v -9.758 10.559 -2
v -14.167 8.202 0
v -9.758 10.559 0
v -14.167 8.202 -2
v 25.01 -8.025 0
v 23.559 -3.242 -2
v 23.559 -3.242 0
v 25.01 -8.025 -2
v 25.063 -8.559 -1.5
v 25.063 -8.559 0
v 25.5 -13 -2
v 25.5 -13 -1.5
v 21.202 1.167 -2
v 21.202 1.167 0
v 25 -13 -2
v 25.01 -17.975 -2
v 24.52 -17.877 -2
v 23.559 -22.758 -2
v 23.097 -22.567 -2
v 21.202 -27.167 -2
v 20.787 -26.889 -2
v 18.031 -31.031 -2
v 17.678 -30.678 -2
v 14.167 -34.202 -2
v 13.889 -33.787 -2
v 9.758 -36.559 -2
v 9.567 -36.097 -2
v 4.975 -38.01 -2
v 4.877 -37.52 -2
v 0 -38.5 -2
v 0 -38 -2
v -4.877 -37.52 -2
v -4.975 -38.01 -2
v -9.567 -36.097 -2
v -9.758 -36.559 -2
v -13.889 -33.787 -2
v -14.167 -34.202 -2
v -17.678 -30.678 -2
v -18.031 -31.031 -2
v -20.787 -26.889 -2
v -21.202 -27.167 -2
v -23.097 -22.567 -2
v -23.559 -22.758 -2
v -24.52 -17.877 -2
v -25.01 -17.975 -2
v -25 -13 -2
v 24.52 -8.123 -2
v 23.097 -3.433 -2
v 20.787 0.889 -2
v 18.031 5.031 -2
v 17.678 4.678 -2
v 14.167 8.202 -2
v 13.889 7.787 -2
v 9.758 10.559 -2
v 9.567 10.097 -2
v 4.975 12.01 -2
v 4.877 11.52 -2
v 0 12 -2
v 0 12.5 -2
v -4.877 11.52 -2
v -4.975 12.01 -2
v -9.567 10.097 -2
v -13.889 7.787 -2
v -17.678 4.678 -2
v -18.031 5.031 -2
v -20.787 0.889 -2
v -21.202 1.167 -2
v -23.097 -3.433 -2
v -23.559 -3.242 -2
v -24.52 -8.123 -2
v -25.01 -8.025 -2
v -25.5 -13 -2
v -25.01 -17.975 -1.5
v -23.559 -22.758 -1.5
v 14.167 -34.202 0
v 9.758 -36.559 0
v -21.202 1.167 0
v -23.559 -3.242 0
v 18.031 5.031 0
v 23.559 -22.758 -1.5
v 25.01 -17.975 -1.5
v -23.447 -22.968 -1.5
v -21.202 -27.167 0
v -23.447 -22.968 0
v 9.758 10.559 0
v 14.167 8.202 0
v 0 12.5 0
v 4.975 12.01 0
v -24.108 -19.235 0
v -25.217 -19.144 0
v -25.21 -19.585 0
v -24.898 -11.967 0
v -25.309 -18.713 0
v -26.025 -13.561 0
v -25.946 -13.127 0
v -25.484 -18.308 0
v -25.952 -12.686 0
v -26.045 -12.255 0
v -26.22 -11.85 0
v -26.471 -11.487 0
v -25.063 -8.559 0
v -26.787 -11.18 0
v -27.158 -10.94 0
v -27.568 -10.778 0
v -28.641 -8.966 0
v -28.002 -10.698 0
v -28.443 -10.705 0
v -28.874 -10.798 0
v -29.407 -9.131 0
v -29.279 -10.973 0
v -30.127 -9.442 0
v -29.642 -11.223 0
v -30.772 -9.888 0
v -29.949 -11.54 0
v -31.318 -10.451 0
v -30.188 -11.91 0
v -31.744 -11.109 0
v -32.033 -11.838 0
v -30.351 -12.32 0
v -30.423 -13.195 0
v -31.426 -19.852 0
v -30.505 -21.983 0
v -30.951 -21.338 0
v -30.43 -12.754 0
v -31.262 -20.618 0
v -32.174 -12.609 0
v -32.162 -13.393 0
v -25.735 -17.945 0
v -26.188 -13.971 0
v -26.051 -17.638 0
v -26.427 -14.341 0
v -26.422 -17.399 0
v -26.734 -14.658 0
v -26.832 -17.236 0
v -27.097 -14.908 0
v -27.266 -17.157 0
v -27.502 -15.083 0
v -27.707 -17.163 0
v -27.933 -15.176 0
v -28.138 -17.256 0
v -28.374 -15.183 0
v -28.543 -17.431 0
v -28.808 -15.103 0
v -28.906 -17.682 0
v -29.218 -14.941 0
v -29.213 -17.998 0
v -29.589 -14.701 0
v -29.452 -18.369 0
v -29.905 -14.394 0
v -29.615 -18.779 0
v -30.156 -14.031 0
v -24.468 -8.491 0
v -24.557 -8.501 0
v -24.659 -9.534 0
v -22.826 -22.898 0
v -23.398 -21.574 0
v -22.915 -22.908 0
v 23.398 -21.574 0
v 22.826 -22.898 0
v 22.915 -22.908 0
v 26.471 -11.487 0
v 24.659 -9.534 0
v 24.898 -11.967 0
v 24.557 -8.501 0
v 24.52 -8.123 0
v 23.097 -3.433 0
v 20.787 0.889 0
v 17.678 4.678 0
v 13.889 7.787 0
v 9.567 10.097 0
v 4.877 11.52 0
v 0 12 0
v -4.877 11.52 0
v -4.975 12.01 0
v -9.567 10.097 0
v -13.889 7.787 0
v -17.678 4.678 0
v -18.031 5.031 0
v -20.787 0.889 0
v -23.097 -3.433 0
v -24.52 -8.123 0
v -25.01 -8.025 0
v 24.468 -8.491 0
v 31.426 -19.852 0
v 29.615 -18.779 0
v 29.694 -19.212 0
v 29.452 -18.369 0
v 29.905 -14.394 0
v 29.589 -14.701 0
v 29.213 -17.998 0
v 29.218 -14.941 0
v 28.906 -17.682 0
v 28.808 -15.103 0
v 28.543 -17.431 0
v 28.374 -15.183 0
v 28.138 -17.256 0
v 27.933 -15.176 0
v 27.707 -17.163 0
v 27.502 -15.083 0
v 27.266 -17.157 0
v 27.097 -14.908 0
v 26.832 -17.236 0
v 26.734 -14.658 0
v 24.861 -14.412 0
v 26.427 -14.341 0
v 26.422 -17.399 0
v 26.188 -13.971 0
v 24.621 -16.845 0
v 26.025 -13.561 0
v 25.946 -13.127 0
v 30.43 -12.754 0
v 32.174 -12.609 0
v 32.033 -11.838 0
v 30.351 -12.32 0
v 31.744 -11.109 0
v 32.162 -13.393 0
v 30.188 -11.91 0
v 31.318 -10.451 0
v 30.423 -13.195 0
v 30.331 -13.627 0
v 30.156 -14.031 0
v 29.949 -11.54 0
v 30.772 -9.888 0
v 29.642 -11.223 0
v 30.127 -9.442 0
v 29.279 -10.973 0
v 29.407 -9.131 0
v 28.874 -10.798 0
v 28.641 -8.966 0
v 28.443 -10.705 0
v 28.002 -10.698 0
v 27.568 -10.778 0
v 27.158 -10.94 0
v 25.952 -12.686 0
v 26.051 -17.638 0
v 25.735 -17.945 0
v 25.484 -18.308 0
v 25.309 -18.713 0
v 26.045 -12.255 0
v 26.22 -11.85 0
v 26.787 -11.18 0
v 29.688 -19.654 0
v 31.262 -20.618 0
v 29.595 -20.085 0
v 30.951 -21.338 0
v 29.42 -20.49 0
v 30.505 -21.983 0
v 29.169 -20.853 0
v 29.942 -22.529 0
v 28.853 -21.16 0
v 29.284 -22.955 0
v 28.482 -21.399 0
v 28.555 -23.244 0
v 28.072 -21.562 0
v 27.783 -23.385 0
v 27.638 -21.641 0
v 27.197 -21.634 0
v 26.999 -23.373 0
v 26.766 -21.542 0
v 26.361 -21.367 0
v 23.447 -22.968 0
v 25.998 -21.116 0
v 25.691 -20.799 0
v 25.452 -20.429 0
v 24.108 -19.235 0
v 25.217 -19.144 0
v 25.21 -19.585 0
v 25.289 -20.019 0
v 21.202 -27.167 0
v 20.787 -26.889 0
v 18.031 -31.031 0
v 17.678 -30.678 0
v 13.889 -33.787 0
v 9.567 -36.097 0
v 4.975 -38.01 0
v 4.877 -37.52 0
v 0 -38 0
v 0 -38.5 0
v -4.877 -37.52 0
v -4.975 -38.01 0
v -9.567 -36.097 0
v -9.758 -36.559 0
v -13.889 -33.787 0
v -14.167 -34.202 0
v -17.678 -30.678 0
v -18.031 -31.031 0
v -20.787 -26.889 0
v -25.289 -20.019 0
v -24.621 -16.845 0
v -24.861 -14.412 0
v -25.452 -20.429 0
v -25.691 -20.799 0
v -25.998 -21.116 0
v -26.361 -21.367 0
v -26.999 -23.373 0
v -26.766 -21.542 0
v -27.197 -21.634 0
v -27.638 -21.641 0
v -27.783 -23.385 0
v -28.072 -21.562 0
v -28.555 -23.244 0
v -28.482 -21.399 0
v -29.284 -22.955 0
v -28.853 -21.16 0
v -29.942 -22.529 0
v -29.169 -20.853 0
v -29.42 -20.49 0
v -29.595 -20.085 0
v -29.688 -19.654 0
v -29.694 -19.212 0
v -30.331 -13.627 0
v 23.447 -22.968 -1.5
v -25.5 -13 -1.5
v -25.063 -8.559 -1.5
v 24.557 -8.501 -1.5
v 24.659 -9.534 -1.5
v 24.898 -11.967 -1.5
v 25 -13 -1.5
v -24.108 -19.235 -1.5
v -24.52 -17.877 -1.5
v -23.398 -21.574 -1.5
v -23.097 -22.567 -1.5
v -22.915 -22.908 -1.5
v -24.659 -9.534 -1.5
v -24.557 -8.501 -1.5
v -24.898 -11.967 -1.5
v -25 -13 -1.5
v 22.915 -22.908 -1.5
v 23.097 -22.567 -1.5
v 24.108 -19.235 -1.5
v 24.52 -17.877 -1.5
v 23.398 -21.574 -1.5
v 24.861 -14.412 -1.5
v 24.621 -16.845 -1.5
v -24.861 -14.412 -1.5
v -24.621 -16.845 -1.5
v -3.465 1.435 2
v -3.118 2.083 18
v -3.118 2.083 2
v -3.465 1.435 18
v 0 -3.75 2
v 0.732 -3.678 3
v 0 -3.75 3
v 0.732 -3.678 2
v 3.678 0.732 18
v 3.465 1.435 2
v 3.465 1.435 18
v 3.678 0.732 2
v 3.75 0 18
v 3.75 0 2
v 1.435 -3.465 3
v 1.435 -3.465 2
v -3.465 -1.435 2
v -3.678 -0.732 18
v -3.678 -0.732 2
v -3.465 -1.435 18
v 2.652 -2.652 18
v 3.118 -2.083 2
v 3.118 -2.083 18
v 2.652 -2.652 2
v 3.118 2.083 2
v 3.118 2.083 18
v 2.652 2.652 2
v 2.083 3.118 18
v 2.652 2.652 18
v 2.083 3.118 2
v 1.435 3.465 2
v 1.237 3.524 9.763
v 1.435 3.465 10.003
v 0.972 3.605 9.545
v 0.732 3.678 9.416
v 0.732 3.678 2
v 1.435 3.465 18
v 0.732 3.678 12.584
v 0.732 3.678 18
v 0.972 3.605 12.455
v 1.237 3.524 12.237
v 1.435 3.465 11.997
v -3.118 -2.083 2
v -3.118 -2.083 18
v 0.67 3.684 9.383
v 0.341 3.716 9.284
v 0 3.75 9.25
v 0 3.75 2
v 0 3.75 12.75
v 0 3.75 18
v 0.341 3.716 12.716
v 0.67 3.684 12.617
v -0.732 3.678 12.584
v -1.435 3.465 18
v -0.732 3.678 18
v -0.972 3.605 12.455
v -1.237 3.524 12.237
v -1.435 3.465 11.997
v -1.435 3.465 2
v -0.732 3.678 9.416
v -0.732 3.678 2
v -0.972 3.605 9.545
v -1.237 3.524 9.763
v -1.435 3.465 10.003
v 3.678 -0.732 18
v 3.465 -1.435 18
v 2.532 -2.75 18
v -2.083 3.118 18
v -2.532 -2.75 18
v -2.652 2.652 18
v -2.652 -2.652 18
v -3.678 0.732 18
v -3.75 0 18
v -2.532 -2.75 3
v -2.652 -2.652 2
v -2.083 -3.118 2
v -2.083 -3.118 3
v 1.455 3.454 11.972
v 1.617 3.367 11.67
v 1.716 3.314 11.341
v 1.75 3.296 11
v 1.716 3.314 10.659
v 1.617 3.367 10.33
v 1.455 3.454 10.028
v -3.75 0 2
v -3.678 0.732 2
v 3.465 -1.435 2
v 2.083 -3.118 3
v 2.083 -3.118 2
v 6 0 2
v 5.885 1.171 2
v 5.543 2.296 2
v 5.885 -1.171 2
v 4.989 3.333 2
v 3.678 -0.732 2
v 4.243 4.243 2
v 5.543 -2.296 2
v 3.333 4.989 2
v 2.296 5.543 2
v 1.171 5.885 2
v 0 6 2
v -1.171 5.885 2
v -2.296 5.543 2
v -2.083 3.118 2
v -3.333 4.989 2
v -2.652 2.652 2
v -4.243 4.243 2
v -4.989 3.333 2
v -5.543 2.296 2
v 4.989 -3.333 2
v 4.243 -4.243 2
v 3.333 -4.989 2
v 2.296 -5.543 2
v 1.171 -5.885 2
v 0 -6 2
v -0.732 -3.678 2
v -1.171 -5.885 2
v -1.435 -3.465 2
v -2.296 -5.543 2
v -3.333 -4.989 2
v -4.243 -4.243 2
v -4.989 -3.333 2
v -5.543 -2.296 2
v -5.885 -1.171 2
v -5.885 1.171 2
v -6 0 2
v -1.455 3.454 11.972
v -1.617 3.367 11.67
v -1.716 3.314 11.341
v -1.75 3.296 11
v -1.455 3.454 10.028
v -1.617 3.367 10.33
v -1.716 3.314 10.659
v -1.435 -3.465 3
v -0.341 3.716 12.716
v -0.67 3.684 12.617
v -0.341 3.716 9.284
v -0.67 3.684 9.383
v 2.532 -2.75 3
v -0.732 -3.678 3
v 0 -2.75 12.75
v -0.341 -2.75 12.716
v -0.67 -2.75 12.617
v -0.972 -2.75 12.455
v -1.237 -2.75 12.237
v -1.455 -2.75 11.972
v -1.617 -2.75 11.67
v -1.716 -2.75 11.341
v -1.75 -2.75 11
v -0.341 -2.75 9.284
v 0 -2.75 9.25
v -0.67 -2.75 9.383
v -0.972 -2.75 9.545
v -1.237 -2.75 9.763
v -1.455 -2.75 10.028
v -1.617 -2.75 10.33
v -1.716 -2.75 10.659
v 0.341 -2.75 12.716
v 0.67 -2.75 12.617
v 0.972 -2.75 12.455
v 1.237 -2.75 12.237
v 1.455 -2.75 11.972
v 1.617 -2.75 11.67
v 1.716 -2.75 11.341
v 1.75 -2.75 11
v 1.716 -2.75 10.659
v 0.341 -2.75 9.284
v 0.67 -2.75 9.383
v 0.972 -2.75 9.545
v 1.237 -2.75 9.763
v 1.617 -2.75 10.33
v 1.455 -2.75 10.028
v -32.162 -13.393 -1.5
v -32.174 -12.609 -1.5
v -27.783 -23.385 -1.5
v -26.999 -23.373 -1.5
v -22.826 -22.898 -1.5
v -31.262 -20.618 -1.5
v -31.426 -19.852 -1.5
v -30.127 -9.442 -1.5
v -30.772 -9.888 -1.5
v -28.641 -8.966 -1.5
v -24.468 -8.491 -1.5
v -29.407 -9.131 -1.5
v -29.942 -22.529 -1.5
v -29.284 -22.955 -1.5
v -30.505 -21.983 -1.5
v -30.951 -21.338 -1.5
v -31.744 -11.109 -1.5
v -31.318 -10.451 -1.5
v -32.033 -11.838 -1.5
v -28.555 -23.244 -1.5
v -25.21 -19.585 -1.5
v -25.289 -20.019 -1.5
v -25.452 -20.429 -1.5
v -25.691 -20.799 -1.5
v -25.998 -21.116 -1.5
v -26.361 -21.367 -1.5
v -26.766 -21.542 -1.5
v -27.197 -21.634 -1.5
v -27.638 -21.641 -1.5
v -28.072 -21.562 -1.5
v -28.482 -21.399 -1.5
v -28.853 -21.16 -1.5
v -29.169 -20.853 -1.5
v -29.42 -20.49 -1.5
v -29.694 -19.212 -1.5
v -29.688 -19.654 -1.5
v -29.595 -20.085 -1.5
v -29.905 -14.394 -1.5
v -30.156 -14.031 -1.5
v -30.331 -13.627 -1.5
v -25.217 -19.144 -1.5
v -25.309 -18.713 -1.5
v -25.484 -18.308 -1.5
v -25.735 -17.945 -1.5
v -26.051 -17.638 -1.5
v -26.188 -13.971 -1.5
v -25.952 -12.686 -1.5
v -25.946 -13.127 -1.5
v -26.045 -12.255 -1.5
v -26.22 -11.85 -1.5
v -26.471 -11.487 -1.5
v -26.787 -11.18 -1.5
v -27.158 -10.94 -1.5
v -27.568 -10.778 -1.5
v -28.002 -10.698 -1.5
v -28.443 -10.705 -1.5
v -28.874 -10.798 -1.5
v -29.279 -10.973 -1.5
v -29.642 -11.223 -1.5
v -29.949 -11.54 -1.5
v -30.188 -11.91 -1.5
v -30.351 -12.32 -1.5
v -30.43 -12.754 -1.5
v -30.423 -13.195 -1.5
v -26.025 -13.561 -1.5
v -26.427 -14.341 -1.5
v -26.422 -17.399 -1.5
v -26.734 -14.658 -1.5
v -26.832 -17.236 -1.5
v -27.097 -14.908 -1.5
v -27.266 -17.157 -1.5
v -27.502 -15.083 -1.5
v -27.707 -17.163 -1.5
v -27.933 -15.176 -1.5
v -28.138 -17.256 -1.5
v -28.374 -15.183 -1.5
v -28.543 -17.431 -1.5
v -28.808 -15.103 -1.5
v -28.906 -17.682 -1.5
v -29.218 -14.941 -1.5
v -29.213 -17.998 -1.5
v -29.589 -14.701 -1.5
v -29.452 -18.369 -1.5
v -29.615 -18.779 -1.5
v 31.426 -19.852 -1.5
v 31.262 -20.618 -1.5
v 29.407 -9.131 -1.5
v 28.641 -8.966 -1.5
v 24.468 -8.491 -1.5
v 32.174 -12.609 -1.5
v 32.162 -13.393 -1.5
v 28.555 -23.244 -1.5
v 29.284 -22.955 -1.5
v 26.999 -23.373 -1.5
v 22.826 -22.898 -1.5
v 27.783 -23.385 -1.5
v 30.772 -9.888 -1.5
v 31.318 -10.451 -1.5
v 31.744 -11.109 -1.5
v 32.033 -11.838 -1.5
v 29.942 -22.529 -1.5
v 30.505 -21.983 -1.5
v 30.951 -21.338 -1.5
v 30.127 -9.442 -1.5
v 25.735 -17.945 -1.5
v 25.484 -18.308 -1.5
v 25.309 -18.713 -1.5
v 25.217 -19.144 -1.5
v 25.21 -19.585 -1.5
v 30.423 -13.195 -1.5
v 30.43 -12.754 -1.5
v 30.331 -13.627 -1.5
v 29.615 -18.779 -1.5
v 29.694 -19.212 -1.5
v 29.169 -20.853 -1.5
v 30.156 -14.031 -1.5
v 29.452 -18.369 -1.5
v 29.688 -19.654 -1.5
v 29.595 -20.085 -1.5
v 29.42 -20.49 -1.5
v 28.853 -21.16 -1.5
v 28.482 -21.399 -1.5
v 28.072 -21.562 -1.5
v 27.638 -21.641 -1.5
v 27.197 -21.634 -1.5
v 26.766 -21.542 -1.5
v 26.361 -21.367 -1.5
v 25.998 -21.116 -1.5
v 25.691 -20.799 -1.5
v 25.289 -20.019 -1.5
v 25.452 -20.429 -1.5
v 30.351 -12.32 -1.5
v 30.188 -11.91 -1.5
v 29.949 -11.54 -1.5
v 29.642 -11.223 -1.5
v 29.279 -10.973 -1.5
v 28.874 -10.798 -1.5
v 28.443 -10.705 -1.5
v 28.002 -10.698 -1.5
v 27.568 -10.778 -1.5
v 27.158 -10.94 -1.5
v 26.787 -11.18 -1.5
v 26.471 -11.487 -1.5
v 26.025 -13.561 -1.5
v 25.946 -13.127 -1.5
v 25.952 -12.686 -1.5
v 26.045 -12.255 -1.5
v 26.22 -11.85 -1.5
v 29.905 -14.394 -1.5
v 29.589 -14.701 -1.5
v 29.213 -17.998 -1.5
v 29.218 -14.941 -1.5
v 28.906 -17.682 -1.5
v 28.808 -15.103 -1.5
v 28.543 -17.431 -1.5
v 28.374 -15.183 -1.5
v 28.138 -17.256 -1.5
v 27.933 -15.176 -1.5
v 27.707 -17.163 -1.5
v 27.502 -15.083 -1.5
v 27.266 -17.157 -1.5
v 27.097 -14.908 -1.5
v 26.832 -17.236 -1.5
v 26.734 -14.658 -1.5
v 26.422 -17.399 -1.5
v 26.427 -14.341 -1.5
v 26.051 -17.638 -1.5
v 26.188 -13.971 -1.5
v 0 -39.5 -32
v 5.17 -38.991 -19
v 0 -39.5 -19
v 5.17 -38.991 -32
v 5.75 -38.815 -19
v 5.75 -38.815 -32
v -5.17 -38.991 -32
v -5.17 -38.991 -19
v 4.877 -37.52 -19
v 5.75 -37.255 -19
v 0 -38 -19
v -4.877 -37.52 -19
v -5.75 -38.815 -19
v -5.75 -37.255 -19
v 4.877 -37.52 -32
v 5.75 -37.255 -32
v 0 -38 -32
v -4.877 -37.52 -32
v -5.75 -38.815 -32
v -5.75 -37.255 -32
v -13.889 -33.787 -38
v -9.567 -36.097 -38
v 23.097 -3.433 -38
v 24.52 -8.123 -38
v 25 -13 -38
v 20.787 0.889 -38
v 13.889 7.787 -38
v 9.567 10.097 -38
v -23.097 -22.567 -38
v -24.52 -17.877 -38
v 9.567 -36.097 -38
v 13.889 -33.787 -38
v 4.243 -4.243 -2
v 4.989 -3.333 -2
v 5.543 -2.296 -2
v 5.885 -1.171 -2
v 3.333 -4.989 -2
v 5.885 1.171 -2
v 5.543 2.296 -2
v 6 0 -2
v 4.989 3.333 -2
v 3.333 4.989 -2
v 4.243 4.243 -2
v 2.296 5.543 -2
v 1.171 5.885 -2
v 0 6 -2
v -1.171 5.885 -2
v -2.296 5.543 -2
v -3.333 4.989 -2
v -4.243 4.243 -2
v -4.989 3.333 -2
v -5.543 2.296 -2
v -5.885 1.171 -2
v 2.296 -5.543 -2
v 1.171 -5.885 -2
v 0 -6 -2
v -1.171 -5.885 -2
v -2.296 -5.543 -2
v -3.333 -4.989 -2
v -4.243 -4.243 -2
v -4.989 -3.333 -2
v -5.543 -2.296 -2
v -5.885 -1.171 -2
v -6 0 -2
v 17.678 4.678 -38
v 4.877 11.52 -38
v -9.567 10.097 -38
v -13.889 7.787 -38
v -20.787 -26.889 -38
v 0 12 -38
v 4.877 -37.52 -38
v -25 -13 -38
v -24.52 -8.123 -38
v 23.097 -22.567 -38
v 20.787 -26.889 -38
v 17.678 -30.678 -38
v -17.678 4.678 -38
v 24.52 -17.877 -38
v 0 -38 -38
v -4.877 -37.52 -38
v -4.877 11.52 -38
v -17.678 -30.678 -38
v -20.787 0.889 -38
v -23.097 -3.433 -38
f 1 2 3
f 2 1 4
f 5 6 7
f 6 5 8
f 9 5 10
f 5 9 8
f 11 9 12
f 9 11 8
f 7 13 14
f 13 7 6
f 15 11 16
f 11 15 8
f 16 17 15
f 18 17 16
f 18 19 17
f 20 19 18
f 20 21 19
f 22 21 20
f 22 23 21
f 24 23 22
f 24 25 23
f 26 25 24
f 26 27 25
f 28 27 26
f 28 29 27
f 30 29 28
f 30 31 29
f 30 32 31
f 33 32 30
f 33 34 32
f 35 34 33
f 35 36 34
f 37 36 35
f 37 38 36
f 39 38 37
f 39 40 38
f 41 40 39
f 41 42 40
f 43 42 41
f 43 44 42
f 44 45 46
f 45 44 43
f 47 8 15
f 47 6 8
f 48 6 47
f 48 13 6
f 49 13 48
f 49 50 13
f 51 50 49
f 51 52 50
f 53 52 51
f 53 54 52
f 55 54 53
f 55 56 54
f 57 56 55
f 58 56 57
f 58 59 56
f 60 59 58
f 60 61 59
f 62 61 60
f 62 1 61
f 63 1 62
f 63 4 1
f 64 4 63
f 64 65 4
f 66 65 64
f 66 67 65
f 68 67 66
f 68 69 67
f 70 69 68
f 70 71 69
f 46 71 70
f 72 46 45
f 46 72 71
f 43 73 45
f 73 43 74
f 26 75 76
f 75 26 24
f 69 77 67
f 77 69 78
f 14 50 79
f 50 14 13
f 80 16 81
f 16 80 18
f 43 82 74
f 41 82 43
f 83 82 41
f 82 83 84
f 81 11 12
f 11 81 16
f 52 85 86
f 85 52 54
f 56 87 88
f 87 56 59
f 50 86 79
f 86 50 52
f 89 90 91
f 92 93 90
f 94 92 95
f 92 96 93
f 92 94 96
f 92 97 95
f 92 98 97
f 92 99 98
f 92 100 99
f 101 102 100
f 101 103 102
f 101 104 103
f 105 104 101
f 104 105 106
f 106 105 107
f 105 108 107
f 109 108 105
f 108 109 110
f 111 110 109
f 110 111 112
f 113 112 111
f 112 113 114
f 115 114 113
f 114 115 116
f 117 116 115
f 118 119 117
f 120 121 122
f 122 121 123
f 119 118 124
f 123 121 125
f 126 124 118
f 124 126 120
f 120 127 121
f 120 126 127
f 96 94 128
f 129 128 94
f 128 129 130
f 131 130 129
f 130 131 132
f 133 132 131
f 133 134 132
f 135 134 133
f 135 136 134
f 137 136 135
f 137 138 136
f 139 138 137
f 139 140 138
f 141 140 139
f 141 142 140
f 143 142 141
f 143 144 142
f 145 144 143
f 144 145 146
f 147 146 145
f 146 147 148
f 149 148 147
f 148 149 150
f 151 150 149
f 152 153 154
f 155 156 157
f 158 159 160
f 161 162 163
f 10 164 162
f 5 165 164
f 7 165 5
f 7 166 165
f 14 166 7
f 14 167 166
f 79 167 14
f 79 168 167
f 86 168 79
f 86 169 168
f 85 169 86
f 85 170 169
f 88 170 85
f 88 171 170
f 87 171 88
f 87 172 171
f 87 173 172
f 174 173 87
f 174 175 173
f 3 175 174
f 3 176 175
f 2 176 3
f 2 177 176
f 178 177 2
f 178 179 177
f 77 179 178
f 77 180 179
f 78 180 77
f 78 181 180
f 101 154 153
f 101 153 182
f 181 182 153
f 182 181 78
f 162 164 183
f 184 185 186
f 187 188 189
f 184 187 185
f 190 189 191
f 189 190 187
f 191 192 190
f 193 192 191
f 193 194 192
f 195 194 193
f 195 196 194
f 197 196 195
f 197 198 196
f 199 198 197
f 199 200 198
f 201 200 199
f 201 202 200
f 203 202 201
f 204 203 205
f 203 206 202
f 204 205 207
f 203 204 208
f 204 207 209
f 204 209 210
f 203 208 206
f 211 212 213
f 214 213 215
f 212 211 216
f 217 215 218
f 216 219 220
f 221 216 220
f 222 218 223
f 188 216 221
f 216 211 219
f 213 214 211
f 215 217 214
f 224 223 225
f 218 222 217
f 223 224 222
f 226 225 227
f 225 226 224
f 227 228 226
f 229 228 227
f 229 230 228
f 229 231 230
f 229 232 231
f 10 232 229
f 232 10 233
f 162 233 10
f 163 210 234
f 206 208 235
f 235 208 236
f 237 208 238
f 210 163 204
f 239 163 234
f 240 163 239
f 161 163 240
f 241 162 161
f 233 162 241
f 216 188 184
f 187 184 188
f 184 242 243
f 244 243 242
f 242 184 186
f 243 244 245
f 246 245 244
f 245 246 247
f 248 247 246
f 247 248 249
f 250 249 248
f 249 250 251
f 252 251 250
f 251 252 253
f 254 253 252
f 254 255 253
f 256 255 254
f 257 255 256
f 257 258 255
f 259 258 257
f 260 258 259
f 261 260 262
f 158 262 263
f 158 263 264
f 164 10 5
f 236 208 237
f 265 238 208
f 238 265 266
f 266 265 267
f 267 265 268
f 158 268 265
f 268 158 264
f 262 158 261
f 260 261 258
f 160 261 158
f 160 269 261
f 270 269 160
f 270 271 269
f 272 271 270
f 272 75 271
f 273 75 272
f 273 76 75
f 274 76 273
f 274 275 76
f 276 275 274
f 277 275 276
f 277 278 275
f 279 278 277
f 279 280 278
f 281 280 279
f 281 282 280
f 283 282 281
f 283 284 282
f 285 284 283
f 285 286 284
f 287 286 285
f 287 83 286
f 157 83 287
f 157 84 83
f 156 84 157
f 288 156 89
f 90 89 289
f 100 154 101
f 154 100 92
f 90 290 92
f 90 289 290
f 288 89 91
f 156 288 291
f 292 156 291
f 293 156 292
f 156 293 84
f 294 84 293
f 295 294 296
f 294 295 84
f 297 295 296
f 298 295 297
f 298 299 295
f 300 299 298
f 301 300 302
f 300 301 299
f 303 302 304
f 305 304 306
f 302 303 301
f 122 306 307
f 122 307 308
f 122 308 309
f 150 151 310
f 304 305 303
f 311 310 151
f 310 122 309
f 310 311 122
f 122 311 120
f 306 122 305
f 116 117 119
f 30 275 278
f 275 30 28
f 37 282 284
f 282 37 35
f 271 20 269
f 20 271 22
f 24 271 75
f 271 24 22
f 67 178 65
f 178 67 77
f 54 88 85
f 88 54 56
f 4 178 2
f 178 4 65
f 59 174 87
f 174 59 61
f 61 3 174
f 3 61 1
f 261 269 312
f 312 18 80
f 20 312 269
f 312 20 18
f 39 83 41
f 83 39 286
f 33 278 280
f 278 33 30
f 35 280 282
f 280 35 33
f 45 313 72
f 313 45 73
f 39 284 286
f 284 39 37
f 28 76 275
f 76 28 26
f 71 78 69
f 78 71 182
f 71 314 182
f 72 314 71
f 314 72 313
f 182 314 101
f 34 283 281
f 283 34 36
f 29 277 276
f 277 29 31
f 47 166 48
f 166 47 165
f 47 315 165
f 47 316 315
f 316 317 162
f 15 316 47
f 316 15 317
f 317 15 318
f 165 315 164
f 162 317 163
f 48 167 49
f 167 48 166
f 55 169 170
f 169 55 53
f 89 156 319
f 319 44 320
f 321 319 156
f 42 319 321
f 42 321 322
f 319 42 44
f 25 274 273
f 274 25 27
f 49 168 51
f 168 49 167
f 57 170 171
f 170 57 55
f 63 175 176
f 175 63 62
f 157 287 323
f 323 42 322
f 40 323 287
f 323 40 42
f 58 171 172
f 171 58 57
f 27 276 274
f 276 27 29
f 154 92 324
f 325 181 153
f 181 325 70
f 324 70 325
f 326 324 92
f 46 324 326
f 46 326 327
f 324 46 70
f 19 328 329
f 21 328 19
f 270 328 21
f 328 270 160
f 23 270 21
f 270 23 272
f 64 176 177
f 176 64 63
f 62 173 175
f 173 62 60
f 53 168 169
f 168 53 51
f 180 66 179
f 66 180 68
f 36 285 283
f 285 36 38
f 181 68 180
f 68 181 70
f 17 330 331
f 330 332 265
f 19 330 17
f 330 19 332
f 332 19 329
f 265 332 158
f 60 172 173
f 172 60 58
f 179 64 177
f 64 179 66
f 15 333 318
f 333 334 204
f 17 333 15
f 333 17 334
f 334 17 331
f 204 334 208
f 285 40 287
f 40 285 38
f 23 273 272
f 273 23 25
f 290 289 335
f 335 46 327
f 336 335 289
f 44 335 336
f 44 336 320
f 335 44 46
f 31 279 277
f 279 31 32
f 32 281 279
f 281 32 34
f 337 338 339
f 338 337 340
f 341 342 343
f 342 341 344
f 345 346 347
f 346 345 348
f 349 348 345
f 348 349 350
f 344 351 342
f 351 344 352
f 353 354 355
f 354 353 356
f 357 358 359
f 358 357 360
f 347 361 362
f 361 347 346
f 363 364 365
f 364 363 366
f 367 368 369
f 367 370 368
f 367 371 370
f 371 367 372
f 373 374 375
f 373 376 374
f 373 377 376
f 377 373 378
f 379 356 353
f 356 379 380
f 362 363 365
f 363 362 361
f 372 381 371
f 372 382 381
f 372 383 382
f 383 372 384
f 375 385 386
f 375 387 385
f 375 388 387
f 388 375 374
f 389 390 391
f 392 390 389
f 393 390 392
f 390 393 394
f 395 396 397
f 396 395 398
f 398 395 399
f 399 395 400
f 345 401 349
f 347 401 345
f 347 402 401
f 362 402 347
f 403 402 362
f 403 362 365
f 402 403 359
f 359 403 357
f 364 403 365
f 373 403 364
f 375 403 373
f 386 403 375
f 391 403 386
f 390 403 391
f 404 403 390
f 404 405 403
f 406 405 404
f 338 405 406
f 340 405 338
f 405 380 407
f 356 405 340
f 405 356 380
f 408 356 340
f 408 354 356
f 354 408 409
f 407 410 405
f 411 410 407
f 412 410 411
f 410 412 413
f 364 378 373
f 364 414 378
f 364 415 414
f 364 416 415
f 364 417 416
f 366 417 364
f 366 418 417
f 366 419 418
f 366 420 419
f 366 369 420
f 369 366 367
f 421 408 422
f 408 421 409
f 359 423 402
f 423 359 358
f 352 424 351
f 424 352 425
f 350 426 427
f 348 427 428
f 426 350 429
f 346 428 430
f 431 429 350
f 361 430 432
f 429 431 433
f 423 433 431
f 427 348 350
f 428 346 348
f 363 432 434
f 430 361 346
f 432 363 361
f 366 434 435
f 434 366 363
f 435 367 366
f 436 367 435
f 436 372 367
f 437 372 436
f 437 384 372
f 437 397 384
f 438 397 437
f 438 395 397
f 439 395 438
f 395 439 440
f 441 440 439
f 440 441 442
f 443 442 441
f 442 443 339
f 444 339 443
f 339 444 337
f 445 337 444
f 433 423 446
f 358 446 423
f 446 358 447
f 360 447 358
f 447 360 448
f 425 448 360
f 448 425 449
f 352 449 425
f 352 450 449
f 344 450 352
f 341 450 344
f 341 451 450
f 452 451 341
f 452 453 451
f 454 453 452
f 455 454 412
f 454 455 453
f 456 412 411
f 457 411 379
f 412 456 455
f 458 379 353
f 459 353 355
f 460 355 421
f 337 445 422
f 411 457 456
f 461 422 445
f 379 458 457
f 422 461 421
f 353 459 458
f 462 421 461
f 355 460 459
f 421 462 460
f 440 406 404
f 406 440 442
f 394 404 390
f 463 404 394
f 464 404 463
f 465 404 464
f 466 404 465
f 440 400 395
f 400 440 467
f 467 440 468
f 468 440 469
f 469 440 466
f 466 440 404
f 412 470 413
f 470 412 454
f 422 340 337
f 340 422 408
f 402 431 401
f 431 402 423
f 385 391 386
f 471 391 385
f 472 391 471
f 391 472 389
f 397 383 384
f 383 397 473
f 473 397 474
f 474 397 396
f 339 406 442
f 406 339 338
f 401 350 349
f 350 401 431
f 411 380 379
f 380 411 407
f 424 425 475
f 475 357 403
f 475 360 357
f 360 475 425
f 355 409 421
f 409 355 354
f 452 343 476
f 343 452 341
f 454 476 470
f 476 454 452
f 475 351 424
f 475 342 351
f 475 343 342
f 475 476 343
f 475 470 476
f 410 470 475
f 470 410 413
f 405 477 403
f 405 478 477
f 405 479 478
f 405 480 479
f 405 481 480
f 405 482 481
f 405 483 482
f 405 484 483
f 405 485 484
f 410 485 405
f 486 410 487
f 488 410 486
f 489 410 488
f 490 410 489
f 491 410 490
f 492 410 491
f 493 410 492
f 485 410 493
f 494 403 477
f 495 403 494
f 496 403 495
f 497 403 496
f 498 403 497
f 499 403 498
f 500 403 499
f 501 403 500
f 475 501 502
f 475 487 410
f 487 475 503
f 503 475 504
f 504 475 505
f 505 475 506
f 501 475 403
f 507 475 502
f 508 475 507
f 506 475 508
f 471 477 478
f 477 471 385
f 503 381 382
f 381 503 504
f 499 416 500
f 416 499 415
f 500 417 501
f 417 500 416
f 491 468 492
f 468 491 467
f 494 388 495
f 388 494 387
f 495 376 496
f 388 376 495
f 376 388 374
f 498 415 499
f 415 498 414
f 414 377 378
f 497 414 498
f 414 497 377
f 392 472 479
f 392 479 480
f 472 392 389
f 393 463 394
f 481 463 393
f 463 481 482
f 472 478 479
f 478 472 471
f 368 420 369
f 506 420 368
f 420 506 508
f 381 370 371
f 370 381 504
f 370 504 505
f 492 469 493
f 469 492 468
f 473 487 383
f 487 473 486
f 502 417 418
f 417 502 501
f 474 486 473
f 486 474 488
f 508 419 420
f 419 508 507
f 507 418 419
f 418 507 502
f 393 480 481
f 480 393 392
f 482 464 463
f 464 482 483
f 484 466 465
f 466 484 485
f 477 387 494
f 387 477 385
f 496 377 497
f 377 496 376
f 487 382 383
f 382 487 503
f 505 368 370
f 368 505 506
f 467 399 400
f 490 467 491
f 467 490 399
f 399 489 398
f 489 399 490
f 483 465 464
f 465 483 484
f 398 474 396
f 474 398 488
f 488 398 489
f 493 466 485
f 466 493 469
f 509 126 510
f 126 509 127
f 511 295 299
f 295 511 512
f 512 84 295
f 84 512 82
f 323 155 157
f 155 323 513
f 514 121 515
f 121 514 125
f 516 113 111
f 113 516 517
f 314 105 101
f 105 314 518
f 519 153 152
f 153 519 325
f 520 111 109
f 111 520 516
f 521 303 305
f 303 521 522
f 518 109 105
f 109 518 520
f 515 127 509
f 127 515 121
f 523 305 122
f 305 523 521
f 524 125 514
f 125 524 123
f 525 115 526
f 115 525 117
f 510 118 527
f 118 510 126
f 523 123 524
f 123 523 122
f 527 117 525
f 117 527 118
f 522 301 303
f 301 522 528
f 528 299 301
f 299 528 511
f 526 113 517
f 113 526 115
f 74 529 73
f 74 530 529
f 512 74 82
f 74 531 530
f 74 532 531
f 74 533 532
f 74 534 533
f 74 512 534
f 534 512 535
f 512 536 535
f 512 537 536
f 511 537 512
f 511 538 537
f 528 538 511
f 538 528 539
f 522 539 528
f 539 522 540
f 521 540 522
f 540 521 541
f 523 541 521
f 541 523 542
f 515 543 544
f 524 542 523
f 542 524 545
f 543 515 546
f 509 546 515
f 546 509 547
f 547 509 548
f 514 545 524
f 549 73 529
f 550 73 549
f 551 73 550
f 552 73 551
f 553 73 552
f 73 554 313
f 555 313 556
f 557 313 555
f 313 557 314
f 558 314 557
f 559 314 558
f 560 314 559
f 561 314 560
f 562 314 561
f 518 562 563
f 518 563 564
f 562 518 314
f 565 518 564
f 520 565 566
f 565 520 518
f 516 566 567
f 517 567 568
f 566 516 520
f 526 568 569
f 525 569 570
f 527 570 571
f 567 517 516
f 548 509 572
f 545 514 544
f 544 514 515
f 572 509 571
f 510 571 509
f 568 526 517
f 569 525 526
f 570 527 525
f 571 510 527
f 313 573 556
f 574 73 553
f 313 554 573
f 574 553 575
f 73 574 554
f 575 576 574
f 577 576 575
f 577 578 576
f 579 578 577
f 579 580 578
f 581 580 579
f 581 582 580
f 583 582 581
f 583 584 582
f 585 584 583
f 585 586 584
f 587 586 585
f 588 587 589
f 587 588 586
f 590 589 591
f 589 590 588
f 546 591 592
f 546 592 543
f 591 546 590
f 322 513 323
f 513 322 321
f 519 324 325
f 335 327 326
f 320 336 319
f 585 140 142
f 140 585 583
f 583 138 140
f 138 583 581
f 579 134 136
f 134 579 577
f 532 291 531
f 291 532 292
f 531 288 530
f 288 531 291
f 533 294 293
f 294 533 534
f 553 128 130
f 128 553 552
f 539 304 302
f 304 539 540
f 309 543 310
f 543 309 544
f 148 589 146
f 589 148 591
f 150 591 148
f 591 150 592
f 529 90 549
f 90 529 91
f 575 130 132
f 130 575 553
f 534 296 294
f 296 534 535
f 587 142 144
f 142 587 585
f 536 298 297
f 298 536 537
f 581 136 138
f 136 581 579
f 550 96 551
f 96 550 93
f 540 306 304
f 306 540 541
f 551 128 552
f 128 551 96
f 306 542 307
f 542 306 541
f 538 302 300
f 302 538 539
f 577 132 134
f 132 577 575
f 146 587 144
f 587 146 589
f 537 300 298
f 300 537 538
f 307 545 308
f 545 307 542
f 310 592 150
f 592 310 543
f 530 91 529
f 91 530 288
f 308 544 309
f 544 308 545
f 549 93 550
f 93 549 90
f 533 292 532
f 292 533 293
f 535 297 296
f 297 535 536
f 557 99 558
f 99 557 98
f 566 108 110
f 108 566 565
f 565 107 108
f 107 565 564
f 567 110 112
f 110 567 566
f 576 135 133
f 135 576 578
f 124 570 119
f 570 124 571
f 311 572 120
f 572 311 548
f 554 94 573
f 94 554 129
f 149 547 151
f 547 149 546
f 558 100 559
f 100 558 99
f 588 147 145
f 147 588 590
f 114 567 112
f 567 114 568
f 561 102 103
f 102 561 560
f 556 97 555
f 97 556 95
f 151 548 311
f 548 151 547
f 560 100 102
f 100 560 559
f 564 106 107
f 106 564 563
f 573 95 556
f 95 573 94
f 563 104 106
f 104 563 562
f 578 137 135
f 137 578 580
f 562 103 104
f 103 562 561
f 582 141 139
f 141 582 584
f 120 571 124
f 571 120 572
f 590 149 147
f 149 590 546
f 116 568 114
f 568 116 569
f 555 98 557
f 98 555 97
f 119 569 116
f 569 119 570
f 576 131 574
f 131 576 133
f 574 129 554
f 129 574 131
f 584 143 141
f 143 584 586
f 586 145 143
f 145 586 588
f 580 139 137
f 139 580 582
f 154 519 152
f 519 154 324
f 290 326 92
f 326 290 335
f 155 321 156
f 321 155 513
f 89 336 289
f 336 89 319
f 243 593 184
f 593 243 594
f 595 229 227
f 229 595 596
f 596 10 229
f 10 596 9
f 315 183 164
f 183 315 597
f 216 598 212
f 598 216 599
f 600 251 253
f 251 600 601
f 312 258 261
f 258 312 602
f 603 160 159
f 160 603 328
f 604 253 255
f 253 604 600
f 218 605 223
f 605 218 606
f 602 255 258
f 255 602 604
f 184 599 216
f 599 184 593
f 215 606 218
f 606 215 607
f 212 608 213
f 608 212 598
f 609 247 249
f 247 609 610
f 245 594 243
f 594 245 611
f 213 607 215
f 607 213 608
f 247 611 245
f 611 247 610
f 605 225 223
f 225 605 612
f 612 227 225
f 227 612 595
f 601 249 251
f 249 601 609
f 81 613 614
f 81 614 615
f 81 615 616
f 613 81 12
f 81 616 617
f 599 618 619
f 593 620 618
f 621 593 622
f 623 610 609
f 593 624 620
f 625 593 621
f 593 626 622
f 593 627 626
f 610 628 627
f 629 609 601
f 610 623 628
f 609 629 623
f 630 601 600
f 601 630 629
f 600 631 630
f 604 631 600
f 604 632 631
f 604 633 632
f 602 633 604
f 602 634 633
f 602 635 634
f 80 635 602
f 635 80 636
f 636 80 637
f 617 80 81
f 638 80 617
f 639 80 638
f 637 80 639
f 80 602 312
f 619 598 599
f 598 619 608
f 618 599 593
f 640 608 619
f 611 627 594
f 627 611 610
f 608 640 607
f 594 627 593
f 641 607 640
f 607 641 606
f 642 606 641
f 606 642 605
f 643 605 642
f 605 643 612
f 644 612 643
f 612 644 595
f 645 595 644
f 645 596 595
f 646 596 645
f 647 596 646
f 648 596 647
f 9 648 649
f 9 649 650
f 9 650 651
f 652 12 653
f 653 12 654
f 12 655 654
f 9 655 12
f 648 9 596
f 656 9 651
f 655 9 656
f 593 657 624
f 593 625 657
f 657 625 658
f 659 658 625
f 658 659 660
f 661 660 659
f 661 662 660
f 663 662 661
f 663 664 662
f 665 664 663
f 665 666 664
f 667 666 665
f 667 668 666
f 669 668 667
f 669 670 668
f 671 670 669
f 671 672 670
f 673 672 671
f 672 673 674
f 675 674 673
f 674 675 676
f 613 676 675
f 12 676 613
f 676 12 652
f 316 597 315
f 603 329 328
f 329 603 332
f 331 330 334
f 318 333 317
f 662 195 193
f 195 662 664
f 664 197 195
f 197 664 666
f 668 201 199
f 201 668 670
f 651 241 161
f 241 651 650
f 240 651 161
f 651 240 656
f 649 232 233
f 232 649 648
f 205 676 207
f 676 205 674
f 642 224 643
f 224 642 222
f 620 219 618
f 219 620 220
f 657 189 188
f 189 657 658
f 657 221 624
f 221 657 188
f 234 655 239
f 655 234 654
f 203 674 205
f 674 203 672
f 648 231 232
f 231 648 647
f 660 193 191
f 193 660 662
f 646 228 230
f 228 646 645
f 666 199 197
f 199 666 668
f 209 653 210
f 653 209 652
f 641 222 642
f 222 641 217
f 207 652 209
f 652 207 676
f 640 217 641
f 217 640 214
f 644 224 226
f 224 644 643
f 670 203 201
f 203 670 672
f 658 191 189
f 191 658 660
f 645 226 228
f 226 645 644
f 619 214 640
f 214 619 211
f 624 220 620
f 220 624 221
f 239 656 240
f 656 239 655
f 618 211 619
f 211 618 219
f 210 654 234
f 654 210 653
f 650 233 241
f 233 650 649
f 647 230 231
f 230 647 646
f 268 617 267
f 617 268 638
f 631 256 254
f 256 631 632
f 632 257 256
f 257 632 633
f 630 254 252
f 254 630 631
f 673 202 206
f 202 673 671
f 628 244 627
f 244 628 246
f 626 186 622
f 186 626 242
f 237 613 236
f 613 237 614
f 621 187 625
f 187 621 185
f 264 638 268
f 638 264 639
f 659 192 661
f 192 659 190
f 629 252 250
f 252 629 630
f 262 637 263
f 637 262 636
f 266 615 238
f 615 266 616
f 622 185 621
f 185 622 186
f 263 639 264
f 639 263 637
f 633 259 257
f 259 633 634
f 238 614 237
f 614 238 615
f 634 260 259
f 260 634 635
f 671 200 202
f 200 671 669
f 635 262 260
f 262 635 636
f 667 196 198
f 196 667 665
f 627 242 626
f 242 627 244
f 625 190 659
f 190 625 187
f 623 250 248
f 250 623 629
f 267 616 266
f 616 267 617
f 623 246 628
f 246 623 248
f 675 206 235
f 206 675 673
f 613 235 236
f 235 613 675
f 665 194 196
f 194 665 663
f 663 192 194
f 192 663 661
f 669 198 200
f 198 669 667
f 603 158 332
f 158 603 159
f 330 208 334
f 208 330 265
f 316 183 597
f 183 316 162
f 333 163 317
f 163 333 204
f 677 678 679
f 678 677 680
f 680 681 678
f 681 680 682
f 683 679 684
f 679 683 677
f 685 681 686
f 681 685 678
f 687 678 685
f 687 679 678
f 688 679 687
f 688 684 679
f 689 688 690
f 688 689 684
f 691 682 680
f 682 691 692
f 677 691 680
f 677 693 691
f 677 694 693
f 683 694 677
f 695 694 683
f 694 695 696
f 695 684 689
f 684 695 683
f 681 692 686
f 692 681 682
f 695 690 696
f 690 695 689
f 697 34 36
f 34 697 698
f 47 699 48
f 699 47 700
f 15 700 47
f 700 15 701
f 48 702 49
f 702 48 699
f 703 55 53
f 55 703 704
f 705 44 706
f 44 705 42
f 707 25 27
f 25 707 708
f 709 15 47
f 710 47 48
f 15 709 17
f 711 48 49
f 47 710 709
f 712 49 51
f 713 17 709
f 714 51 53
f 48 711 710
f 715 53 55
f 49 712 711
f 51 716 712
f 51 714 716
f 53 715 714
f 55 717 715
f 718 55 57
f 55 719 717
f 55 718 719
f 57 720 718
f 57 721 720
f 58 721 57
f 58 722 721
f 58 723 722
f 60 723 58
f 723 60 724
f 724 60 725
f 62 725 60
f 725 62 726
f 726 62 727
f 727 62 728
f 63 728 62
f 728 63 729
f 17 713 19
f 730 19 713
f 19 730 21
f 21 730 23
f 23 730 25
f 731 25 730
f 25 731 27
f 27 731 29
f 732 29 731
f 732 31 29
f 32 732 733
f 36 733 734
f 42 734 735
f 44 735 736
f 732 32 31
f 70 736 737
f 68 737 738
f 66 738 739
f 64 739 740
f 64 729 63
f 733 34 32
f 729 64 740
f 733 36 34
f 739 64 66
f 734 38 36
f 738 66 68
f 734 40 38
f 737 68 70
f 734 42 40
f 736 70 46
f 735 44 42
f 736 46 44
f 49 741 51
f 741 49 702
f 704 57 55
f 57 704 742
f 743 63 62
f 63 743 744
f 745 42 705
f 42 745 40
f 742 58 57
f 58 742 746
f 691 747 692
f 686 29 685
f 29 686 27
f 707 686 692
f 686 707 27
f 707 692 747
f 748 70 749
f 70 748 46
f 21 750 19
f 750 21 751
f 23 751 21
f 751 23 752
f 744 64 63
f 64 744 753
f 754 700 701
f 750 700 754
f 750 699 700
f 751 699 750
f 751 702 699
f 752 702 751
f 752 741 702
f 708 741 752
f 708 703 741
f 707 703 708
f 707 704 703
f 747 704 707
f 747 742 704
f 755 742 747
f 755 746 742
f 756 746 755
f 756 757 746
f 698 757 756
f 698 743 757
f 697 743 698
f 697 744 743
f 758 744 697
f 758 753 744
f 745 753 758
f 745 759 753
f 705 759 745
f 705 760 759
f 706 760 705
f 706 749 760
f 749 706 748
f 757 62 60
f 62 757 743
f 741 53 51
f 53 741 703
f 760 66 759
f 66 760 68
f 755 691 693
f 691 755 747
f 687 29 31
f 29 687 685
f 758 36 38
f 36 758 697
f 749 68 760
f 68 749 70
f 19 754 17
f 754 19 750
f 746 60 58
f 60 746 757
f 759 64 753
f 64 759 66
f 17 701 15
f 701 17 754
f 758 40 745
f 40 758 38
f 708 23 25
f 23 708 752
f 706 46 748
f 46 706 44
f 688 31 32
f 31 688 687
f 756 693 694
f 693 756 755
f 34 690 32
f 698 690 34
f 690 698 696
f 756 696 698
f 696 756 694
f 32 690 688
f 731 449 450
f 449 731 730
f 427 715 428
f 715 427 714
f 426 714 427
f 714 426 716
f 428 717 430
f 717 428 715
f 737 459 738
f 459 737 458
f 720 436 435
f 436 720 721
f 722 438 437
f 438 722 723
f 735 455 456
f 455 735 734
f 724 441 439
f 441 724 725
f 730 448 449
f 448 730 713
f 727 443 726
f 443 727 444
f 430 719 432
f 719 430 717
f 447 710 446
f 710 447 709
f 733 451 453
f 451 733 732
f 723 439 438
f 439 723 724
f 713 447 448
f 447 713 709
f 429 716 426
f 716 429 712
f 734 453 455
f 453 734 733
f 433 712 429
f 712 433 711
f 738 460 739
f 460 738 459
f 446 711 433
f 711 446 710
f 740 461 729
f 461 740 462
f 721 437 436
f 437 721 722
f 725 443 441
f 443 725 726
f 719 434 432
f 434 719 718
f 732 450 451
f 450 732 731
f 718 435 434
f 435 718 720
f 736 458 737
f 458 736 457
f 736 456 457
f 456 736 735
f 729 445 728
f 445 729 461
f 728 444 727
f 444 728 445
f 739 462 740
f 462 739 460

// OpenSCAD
$fn=32;
tabA=96.5;

liftMotor();

// difference() {
//   translate([-35,-12,0]) cube([70,34,2]);
//   translate([0,0,-0.1]) liftMotorholes(2.2);
// }

module liftMotorHoles(h) {
  translate([0,13,0]) cylinder(r=6.5, h=h);
  rotate([0,0,tabA]) {
    translate([-3.25,23.5+4.5,0]) cylinder(r=2.25,h=h);
    translate([3.25,23.5+4.5,0]) cylinder(r=2.25,h=h);
  }
  rotate([0,0,-tabA]) {
    translate([-3.25,23.5+4.5,0]) cylinder(r=2.25,h=h);
    translate([3.25,23.5+4.5,0]) cylinder(r=2.25,h=h);
  }
}


module tab() {
  translate([0,0,36.5]) difference() {
    translate([0,23.5,0]) difference() {
      hull() {
        translate([-3.25,4.5,0])  cylinder(r=4,h=1.5);
        translate([3.25,4.5,0])  cylinder(r=4,h=1.5);
        translate([-7.25,0,0]) cube([14.5,1,1.5]);
      }
      translate([-3.25,4.5,-0.1])  cylinder(r=2.25,h=1.7);
      translate([3.25,4.5,-0.1])  cylinder(r=2.25,h=1.7);
    }
    translate([0,0,-0.1]) cylinder(r=25,h=2);
  }
}

module liftMotor() {
  translate([0,-13,-38]) {
    color("gray") cylinder(r=25, h=36);
    color("gray") translate([0,0,36]) difference() {
      cylinder(r=25.5, h=2);
      translate([0,0,-0.1]) cylinder(r=25, h=2.2);
    }
    translate([0,13,36]) color("gray") cylinder(r=6, h=4);
    translate([0,13,40]) color("silver") peg();
    color("gray")  rotate([0,0,tabA]) tab();
    color("gray")  rotate([0,0,-tabA]) tab();
    color("black") translate([0,0,6]) intersection() {
      cylinder(r=26.5,h=13);
      translate([-5.75,-100,0]) cube([11.5,100,100]);
    }
  }
}

module peg() {
  difference() {
    difference() {
      cylinder(r=3.75,h=16);
      translate([-50,-100-2.75,1]) cube([100,100,15.1]);
    }
    translate([0,50,9]) rotate([90,0,0]) cylinder(r=1.75,h=100);
  }
}

module adapter() {
  difference() {
    cylinder(r=5.75,h=15);
    translate([0,0,-1]) intersection() {
      cylinder(r=3.75,h=17);
      translate([-50,-2.75,0]) cube([100,100,17]);
    }
    translate([0,50,9]) rotate([90,0,0]) cylinder(r=1.75,h=100);
  }
}
